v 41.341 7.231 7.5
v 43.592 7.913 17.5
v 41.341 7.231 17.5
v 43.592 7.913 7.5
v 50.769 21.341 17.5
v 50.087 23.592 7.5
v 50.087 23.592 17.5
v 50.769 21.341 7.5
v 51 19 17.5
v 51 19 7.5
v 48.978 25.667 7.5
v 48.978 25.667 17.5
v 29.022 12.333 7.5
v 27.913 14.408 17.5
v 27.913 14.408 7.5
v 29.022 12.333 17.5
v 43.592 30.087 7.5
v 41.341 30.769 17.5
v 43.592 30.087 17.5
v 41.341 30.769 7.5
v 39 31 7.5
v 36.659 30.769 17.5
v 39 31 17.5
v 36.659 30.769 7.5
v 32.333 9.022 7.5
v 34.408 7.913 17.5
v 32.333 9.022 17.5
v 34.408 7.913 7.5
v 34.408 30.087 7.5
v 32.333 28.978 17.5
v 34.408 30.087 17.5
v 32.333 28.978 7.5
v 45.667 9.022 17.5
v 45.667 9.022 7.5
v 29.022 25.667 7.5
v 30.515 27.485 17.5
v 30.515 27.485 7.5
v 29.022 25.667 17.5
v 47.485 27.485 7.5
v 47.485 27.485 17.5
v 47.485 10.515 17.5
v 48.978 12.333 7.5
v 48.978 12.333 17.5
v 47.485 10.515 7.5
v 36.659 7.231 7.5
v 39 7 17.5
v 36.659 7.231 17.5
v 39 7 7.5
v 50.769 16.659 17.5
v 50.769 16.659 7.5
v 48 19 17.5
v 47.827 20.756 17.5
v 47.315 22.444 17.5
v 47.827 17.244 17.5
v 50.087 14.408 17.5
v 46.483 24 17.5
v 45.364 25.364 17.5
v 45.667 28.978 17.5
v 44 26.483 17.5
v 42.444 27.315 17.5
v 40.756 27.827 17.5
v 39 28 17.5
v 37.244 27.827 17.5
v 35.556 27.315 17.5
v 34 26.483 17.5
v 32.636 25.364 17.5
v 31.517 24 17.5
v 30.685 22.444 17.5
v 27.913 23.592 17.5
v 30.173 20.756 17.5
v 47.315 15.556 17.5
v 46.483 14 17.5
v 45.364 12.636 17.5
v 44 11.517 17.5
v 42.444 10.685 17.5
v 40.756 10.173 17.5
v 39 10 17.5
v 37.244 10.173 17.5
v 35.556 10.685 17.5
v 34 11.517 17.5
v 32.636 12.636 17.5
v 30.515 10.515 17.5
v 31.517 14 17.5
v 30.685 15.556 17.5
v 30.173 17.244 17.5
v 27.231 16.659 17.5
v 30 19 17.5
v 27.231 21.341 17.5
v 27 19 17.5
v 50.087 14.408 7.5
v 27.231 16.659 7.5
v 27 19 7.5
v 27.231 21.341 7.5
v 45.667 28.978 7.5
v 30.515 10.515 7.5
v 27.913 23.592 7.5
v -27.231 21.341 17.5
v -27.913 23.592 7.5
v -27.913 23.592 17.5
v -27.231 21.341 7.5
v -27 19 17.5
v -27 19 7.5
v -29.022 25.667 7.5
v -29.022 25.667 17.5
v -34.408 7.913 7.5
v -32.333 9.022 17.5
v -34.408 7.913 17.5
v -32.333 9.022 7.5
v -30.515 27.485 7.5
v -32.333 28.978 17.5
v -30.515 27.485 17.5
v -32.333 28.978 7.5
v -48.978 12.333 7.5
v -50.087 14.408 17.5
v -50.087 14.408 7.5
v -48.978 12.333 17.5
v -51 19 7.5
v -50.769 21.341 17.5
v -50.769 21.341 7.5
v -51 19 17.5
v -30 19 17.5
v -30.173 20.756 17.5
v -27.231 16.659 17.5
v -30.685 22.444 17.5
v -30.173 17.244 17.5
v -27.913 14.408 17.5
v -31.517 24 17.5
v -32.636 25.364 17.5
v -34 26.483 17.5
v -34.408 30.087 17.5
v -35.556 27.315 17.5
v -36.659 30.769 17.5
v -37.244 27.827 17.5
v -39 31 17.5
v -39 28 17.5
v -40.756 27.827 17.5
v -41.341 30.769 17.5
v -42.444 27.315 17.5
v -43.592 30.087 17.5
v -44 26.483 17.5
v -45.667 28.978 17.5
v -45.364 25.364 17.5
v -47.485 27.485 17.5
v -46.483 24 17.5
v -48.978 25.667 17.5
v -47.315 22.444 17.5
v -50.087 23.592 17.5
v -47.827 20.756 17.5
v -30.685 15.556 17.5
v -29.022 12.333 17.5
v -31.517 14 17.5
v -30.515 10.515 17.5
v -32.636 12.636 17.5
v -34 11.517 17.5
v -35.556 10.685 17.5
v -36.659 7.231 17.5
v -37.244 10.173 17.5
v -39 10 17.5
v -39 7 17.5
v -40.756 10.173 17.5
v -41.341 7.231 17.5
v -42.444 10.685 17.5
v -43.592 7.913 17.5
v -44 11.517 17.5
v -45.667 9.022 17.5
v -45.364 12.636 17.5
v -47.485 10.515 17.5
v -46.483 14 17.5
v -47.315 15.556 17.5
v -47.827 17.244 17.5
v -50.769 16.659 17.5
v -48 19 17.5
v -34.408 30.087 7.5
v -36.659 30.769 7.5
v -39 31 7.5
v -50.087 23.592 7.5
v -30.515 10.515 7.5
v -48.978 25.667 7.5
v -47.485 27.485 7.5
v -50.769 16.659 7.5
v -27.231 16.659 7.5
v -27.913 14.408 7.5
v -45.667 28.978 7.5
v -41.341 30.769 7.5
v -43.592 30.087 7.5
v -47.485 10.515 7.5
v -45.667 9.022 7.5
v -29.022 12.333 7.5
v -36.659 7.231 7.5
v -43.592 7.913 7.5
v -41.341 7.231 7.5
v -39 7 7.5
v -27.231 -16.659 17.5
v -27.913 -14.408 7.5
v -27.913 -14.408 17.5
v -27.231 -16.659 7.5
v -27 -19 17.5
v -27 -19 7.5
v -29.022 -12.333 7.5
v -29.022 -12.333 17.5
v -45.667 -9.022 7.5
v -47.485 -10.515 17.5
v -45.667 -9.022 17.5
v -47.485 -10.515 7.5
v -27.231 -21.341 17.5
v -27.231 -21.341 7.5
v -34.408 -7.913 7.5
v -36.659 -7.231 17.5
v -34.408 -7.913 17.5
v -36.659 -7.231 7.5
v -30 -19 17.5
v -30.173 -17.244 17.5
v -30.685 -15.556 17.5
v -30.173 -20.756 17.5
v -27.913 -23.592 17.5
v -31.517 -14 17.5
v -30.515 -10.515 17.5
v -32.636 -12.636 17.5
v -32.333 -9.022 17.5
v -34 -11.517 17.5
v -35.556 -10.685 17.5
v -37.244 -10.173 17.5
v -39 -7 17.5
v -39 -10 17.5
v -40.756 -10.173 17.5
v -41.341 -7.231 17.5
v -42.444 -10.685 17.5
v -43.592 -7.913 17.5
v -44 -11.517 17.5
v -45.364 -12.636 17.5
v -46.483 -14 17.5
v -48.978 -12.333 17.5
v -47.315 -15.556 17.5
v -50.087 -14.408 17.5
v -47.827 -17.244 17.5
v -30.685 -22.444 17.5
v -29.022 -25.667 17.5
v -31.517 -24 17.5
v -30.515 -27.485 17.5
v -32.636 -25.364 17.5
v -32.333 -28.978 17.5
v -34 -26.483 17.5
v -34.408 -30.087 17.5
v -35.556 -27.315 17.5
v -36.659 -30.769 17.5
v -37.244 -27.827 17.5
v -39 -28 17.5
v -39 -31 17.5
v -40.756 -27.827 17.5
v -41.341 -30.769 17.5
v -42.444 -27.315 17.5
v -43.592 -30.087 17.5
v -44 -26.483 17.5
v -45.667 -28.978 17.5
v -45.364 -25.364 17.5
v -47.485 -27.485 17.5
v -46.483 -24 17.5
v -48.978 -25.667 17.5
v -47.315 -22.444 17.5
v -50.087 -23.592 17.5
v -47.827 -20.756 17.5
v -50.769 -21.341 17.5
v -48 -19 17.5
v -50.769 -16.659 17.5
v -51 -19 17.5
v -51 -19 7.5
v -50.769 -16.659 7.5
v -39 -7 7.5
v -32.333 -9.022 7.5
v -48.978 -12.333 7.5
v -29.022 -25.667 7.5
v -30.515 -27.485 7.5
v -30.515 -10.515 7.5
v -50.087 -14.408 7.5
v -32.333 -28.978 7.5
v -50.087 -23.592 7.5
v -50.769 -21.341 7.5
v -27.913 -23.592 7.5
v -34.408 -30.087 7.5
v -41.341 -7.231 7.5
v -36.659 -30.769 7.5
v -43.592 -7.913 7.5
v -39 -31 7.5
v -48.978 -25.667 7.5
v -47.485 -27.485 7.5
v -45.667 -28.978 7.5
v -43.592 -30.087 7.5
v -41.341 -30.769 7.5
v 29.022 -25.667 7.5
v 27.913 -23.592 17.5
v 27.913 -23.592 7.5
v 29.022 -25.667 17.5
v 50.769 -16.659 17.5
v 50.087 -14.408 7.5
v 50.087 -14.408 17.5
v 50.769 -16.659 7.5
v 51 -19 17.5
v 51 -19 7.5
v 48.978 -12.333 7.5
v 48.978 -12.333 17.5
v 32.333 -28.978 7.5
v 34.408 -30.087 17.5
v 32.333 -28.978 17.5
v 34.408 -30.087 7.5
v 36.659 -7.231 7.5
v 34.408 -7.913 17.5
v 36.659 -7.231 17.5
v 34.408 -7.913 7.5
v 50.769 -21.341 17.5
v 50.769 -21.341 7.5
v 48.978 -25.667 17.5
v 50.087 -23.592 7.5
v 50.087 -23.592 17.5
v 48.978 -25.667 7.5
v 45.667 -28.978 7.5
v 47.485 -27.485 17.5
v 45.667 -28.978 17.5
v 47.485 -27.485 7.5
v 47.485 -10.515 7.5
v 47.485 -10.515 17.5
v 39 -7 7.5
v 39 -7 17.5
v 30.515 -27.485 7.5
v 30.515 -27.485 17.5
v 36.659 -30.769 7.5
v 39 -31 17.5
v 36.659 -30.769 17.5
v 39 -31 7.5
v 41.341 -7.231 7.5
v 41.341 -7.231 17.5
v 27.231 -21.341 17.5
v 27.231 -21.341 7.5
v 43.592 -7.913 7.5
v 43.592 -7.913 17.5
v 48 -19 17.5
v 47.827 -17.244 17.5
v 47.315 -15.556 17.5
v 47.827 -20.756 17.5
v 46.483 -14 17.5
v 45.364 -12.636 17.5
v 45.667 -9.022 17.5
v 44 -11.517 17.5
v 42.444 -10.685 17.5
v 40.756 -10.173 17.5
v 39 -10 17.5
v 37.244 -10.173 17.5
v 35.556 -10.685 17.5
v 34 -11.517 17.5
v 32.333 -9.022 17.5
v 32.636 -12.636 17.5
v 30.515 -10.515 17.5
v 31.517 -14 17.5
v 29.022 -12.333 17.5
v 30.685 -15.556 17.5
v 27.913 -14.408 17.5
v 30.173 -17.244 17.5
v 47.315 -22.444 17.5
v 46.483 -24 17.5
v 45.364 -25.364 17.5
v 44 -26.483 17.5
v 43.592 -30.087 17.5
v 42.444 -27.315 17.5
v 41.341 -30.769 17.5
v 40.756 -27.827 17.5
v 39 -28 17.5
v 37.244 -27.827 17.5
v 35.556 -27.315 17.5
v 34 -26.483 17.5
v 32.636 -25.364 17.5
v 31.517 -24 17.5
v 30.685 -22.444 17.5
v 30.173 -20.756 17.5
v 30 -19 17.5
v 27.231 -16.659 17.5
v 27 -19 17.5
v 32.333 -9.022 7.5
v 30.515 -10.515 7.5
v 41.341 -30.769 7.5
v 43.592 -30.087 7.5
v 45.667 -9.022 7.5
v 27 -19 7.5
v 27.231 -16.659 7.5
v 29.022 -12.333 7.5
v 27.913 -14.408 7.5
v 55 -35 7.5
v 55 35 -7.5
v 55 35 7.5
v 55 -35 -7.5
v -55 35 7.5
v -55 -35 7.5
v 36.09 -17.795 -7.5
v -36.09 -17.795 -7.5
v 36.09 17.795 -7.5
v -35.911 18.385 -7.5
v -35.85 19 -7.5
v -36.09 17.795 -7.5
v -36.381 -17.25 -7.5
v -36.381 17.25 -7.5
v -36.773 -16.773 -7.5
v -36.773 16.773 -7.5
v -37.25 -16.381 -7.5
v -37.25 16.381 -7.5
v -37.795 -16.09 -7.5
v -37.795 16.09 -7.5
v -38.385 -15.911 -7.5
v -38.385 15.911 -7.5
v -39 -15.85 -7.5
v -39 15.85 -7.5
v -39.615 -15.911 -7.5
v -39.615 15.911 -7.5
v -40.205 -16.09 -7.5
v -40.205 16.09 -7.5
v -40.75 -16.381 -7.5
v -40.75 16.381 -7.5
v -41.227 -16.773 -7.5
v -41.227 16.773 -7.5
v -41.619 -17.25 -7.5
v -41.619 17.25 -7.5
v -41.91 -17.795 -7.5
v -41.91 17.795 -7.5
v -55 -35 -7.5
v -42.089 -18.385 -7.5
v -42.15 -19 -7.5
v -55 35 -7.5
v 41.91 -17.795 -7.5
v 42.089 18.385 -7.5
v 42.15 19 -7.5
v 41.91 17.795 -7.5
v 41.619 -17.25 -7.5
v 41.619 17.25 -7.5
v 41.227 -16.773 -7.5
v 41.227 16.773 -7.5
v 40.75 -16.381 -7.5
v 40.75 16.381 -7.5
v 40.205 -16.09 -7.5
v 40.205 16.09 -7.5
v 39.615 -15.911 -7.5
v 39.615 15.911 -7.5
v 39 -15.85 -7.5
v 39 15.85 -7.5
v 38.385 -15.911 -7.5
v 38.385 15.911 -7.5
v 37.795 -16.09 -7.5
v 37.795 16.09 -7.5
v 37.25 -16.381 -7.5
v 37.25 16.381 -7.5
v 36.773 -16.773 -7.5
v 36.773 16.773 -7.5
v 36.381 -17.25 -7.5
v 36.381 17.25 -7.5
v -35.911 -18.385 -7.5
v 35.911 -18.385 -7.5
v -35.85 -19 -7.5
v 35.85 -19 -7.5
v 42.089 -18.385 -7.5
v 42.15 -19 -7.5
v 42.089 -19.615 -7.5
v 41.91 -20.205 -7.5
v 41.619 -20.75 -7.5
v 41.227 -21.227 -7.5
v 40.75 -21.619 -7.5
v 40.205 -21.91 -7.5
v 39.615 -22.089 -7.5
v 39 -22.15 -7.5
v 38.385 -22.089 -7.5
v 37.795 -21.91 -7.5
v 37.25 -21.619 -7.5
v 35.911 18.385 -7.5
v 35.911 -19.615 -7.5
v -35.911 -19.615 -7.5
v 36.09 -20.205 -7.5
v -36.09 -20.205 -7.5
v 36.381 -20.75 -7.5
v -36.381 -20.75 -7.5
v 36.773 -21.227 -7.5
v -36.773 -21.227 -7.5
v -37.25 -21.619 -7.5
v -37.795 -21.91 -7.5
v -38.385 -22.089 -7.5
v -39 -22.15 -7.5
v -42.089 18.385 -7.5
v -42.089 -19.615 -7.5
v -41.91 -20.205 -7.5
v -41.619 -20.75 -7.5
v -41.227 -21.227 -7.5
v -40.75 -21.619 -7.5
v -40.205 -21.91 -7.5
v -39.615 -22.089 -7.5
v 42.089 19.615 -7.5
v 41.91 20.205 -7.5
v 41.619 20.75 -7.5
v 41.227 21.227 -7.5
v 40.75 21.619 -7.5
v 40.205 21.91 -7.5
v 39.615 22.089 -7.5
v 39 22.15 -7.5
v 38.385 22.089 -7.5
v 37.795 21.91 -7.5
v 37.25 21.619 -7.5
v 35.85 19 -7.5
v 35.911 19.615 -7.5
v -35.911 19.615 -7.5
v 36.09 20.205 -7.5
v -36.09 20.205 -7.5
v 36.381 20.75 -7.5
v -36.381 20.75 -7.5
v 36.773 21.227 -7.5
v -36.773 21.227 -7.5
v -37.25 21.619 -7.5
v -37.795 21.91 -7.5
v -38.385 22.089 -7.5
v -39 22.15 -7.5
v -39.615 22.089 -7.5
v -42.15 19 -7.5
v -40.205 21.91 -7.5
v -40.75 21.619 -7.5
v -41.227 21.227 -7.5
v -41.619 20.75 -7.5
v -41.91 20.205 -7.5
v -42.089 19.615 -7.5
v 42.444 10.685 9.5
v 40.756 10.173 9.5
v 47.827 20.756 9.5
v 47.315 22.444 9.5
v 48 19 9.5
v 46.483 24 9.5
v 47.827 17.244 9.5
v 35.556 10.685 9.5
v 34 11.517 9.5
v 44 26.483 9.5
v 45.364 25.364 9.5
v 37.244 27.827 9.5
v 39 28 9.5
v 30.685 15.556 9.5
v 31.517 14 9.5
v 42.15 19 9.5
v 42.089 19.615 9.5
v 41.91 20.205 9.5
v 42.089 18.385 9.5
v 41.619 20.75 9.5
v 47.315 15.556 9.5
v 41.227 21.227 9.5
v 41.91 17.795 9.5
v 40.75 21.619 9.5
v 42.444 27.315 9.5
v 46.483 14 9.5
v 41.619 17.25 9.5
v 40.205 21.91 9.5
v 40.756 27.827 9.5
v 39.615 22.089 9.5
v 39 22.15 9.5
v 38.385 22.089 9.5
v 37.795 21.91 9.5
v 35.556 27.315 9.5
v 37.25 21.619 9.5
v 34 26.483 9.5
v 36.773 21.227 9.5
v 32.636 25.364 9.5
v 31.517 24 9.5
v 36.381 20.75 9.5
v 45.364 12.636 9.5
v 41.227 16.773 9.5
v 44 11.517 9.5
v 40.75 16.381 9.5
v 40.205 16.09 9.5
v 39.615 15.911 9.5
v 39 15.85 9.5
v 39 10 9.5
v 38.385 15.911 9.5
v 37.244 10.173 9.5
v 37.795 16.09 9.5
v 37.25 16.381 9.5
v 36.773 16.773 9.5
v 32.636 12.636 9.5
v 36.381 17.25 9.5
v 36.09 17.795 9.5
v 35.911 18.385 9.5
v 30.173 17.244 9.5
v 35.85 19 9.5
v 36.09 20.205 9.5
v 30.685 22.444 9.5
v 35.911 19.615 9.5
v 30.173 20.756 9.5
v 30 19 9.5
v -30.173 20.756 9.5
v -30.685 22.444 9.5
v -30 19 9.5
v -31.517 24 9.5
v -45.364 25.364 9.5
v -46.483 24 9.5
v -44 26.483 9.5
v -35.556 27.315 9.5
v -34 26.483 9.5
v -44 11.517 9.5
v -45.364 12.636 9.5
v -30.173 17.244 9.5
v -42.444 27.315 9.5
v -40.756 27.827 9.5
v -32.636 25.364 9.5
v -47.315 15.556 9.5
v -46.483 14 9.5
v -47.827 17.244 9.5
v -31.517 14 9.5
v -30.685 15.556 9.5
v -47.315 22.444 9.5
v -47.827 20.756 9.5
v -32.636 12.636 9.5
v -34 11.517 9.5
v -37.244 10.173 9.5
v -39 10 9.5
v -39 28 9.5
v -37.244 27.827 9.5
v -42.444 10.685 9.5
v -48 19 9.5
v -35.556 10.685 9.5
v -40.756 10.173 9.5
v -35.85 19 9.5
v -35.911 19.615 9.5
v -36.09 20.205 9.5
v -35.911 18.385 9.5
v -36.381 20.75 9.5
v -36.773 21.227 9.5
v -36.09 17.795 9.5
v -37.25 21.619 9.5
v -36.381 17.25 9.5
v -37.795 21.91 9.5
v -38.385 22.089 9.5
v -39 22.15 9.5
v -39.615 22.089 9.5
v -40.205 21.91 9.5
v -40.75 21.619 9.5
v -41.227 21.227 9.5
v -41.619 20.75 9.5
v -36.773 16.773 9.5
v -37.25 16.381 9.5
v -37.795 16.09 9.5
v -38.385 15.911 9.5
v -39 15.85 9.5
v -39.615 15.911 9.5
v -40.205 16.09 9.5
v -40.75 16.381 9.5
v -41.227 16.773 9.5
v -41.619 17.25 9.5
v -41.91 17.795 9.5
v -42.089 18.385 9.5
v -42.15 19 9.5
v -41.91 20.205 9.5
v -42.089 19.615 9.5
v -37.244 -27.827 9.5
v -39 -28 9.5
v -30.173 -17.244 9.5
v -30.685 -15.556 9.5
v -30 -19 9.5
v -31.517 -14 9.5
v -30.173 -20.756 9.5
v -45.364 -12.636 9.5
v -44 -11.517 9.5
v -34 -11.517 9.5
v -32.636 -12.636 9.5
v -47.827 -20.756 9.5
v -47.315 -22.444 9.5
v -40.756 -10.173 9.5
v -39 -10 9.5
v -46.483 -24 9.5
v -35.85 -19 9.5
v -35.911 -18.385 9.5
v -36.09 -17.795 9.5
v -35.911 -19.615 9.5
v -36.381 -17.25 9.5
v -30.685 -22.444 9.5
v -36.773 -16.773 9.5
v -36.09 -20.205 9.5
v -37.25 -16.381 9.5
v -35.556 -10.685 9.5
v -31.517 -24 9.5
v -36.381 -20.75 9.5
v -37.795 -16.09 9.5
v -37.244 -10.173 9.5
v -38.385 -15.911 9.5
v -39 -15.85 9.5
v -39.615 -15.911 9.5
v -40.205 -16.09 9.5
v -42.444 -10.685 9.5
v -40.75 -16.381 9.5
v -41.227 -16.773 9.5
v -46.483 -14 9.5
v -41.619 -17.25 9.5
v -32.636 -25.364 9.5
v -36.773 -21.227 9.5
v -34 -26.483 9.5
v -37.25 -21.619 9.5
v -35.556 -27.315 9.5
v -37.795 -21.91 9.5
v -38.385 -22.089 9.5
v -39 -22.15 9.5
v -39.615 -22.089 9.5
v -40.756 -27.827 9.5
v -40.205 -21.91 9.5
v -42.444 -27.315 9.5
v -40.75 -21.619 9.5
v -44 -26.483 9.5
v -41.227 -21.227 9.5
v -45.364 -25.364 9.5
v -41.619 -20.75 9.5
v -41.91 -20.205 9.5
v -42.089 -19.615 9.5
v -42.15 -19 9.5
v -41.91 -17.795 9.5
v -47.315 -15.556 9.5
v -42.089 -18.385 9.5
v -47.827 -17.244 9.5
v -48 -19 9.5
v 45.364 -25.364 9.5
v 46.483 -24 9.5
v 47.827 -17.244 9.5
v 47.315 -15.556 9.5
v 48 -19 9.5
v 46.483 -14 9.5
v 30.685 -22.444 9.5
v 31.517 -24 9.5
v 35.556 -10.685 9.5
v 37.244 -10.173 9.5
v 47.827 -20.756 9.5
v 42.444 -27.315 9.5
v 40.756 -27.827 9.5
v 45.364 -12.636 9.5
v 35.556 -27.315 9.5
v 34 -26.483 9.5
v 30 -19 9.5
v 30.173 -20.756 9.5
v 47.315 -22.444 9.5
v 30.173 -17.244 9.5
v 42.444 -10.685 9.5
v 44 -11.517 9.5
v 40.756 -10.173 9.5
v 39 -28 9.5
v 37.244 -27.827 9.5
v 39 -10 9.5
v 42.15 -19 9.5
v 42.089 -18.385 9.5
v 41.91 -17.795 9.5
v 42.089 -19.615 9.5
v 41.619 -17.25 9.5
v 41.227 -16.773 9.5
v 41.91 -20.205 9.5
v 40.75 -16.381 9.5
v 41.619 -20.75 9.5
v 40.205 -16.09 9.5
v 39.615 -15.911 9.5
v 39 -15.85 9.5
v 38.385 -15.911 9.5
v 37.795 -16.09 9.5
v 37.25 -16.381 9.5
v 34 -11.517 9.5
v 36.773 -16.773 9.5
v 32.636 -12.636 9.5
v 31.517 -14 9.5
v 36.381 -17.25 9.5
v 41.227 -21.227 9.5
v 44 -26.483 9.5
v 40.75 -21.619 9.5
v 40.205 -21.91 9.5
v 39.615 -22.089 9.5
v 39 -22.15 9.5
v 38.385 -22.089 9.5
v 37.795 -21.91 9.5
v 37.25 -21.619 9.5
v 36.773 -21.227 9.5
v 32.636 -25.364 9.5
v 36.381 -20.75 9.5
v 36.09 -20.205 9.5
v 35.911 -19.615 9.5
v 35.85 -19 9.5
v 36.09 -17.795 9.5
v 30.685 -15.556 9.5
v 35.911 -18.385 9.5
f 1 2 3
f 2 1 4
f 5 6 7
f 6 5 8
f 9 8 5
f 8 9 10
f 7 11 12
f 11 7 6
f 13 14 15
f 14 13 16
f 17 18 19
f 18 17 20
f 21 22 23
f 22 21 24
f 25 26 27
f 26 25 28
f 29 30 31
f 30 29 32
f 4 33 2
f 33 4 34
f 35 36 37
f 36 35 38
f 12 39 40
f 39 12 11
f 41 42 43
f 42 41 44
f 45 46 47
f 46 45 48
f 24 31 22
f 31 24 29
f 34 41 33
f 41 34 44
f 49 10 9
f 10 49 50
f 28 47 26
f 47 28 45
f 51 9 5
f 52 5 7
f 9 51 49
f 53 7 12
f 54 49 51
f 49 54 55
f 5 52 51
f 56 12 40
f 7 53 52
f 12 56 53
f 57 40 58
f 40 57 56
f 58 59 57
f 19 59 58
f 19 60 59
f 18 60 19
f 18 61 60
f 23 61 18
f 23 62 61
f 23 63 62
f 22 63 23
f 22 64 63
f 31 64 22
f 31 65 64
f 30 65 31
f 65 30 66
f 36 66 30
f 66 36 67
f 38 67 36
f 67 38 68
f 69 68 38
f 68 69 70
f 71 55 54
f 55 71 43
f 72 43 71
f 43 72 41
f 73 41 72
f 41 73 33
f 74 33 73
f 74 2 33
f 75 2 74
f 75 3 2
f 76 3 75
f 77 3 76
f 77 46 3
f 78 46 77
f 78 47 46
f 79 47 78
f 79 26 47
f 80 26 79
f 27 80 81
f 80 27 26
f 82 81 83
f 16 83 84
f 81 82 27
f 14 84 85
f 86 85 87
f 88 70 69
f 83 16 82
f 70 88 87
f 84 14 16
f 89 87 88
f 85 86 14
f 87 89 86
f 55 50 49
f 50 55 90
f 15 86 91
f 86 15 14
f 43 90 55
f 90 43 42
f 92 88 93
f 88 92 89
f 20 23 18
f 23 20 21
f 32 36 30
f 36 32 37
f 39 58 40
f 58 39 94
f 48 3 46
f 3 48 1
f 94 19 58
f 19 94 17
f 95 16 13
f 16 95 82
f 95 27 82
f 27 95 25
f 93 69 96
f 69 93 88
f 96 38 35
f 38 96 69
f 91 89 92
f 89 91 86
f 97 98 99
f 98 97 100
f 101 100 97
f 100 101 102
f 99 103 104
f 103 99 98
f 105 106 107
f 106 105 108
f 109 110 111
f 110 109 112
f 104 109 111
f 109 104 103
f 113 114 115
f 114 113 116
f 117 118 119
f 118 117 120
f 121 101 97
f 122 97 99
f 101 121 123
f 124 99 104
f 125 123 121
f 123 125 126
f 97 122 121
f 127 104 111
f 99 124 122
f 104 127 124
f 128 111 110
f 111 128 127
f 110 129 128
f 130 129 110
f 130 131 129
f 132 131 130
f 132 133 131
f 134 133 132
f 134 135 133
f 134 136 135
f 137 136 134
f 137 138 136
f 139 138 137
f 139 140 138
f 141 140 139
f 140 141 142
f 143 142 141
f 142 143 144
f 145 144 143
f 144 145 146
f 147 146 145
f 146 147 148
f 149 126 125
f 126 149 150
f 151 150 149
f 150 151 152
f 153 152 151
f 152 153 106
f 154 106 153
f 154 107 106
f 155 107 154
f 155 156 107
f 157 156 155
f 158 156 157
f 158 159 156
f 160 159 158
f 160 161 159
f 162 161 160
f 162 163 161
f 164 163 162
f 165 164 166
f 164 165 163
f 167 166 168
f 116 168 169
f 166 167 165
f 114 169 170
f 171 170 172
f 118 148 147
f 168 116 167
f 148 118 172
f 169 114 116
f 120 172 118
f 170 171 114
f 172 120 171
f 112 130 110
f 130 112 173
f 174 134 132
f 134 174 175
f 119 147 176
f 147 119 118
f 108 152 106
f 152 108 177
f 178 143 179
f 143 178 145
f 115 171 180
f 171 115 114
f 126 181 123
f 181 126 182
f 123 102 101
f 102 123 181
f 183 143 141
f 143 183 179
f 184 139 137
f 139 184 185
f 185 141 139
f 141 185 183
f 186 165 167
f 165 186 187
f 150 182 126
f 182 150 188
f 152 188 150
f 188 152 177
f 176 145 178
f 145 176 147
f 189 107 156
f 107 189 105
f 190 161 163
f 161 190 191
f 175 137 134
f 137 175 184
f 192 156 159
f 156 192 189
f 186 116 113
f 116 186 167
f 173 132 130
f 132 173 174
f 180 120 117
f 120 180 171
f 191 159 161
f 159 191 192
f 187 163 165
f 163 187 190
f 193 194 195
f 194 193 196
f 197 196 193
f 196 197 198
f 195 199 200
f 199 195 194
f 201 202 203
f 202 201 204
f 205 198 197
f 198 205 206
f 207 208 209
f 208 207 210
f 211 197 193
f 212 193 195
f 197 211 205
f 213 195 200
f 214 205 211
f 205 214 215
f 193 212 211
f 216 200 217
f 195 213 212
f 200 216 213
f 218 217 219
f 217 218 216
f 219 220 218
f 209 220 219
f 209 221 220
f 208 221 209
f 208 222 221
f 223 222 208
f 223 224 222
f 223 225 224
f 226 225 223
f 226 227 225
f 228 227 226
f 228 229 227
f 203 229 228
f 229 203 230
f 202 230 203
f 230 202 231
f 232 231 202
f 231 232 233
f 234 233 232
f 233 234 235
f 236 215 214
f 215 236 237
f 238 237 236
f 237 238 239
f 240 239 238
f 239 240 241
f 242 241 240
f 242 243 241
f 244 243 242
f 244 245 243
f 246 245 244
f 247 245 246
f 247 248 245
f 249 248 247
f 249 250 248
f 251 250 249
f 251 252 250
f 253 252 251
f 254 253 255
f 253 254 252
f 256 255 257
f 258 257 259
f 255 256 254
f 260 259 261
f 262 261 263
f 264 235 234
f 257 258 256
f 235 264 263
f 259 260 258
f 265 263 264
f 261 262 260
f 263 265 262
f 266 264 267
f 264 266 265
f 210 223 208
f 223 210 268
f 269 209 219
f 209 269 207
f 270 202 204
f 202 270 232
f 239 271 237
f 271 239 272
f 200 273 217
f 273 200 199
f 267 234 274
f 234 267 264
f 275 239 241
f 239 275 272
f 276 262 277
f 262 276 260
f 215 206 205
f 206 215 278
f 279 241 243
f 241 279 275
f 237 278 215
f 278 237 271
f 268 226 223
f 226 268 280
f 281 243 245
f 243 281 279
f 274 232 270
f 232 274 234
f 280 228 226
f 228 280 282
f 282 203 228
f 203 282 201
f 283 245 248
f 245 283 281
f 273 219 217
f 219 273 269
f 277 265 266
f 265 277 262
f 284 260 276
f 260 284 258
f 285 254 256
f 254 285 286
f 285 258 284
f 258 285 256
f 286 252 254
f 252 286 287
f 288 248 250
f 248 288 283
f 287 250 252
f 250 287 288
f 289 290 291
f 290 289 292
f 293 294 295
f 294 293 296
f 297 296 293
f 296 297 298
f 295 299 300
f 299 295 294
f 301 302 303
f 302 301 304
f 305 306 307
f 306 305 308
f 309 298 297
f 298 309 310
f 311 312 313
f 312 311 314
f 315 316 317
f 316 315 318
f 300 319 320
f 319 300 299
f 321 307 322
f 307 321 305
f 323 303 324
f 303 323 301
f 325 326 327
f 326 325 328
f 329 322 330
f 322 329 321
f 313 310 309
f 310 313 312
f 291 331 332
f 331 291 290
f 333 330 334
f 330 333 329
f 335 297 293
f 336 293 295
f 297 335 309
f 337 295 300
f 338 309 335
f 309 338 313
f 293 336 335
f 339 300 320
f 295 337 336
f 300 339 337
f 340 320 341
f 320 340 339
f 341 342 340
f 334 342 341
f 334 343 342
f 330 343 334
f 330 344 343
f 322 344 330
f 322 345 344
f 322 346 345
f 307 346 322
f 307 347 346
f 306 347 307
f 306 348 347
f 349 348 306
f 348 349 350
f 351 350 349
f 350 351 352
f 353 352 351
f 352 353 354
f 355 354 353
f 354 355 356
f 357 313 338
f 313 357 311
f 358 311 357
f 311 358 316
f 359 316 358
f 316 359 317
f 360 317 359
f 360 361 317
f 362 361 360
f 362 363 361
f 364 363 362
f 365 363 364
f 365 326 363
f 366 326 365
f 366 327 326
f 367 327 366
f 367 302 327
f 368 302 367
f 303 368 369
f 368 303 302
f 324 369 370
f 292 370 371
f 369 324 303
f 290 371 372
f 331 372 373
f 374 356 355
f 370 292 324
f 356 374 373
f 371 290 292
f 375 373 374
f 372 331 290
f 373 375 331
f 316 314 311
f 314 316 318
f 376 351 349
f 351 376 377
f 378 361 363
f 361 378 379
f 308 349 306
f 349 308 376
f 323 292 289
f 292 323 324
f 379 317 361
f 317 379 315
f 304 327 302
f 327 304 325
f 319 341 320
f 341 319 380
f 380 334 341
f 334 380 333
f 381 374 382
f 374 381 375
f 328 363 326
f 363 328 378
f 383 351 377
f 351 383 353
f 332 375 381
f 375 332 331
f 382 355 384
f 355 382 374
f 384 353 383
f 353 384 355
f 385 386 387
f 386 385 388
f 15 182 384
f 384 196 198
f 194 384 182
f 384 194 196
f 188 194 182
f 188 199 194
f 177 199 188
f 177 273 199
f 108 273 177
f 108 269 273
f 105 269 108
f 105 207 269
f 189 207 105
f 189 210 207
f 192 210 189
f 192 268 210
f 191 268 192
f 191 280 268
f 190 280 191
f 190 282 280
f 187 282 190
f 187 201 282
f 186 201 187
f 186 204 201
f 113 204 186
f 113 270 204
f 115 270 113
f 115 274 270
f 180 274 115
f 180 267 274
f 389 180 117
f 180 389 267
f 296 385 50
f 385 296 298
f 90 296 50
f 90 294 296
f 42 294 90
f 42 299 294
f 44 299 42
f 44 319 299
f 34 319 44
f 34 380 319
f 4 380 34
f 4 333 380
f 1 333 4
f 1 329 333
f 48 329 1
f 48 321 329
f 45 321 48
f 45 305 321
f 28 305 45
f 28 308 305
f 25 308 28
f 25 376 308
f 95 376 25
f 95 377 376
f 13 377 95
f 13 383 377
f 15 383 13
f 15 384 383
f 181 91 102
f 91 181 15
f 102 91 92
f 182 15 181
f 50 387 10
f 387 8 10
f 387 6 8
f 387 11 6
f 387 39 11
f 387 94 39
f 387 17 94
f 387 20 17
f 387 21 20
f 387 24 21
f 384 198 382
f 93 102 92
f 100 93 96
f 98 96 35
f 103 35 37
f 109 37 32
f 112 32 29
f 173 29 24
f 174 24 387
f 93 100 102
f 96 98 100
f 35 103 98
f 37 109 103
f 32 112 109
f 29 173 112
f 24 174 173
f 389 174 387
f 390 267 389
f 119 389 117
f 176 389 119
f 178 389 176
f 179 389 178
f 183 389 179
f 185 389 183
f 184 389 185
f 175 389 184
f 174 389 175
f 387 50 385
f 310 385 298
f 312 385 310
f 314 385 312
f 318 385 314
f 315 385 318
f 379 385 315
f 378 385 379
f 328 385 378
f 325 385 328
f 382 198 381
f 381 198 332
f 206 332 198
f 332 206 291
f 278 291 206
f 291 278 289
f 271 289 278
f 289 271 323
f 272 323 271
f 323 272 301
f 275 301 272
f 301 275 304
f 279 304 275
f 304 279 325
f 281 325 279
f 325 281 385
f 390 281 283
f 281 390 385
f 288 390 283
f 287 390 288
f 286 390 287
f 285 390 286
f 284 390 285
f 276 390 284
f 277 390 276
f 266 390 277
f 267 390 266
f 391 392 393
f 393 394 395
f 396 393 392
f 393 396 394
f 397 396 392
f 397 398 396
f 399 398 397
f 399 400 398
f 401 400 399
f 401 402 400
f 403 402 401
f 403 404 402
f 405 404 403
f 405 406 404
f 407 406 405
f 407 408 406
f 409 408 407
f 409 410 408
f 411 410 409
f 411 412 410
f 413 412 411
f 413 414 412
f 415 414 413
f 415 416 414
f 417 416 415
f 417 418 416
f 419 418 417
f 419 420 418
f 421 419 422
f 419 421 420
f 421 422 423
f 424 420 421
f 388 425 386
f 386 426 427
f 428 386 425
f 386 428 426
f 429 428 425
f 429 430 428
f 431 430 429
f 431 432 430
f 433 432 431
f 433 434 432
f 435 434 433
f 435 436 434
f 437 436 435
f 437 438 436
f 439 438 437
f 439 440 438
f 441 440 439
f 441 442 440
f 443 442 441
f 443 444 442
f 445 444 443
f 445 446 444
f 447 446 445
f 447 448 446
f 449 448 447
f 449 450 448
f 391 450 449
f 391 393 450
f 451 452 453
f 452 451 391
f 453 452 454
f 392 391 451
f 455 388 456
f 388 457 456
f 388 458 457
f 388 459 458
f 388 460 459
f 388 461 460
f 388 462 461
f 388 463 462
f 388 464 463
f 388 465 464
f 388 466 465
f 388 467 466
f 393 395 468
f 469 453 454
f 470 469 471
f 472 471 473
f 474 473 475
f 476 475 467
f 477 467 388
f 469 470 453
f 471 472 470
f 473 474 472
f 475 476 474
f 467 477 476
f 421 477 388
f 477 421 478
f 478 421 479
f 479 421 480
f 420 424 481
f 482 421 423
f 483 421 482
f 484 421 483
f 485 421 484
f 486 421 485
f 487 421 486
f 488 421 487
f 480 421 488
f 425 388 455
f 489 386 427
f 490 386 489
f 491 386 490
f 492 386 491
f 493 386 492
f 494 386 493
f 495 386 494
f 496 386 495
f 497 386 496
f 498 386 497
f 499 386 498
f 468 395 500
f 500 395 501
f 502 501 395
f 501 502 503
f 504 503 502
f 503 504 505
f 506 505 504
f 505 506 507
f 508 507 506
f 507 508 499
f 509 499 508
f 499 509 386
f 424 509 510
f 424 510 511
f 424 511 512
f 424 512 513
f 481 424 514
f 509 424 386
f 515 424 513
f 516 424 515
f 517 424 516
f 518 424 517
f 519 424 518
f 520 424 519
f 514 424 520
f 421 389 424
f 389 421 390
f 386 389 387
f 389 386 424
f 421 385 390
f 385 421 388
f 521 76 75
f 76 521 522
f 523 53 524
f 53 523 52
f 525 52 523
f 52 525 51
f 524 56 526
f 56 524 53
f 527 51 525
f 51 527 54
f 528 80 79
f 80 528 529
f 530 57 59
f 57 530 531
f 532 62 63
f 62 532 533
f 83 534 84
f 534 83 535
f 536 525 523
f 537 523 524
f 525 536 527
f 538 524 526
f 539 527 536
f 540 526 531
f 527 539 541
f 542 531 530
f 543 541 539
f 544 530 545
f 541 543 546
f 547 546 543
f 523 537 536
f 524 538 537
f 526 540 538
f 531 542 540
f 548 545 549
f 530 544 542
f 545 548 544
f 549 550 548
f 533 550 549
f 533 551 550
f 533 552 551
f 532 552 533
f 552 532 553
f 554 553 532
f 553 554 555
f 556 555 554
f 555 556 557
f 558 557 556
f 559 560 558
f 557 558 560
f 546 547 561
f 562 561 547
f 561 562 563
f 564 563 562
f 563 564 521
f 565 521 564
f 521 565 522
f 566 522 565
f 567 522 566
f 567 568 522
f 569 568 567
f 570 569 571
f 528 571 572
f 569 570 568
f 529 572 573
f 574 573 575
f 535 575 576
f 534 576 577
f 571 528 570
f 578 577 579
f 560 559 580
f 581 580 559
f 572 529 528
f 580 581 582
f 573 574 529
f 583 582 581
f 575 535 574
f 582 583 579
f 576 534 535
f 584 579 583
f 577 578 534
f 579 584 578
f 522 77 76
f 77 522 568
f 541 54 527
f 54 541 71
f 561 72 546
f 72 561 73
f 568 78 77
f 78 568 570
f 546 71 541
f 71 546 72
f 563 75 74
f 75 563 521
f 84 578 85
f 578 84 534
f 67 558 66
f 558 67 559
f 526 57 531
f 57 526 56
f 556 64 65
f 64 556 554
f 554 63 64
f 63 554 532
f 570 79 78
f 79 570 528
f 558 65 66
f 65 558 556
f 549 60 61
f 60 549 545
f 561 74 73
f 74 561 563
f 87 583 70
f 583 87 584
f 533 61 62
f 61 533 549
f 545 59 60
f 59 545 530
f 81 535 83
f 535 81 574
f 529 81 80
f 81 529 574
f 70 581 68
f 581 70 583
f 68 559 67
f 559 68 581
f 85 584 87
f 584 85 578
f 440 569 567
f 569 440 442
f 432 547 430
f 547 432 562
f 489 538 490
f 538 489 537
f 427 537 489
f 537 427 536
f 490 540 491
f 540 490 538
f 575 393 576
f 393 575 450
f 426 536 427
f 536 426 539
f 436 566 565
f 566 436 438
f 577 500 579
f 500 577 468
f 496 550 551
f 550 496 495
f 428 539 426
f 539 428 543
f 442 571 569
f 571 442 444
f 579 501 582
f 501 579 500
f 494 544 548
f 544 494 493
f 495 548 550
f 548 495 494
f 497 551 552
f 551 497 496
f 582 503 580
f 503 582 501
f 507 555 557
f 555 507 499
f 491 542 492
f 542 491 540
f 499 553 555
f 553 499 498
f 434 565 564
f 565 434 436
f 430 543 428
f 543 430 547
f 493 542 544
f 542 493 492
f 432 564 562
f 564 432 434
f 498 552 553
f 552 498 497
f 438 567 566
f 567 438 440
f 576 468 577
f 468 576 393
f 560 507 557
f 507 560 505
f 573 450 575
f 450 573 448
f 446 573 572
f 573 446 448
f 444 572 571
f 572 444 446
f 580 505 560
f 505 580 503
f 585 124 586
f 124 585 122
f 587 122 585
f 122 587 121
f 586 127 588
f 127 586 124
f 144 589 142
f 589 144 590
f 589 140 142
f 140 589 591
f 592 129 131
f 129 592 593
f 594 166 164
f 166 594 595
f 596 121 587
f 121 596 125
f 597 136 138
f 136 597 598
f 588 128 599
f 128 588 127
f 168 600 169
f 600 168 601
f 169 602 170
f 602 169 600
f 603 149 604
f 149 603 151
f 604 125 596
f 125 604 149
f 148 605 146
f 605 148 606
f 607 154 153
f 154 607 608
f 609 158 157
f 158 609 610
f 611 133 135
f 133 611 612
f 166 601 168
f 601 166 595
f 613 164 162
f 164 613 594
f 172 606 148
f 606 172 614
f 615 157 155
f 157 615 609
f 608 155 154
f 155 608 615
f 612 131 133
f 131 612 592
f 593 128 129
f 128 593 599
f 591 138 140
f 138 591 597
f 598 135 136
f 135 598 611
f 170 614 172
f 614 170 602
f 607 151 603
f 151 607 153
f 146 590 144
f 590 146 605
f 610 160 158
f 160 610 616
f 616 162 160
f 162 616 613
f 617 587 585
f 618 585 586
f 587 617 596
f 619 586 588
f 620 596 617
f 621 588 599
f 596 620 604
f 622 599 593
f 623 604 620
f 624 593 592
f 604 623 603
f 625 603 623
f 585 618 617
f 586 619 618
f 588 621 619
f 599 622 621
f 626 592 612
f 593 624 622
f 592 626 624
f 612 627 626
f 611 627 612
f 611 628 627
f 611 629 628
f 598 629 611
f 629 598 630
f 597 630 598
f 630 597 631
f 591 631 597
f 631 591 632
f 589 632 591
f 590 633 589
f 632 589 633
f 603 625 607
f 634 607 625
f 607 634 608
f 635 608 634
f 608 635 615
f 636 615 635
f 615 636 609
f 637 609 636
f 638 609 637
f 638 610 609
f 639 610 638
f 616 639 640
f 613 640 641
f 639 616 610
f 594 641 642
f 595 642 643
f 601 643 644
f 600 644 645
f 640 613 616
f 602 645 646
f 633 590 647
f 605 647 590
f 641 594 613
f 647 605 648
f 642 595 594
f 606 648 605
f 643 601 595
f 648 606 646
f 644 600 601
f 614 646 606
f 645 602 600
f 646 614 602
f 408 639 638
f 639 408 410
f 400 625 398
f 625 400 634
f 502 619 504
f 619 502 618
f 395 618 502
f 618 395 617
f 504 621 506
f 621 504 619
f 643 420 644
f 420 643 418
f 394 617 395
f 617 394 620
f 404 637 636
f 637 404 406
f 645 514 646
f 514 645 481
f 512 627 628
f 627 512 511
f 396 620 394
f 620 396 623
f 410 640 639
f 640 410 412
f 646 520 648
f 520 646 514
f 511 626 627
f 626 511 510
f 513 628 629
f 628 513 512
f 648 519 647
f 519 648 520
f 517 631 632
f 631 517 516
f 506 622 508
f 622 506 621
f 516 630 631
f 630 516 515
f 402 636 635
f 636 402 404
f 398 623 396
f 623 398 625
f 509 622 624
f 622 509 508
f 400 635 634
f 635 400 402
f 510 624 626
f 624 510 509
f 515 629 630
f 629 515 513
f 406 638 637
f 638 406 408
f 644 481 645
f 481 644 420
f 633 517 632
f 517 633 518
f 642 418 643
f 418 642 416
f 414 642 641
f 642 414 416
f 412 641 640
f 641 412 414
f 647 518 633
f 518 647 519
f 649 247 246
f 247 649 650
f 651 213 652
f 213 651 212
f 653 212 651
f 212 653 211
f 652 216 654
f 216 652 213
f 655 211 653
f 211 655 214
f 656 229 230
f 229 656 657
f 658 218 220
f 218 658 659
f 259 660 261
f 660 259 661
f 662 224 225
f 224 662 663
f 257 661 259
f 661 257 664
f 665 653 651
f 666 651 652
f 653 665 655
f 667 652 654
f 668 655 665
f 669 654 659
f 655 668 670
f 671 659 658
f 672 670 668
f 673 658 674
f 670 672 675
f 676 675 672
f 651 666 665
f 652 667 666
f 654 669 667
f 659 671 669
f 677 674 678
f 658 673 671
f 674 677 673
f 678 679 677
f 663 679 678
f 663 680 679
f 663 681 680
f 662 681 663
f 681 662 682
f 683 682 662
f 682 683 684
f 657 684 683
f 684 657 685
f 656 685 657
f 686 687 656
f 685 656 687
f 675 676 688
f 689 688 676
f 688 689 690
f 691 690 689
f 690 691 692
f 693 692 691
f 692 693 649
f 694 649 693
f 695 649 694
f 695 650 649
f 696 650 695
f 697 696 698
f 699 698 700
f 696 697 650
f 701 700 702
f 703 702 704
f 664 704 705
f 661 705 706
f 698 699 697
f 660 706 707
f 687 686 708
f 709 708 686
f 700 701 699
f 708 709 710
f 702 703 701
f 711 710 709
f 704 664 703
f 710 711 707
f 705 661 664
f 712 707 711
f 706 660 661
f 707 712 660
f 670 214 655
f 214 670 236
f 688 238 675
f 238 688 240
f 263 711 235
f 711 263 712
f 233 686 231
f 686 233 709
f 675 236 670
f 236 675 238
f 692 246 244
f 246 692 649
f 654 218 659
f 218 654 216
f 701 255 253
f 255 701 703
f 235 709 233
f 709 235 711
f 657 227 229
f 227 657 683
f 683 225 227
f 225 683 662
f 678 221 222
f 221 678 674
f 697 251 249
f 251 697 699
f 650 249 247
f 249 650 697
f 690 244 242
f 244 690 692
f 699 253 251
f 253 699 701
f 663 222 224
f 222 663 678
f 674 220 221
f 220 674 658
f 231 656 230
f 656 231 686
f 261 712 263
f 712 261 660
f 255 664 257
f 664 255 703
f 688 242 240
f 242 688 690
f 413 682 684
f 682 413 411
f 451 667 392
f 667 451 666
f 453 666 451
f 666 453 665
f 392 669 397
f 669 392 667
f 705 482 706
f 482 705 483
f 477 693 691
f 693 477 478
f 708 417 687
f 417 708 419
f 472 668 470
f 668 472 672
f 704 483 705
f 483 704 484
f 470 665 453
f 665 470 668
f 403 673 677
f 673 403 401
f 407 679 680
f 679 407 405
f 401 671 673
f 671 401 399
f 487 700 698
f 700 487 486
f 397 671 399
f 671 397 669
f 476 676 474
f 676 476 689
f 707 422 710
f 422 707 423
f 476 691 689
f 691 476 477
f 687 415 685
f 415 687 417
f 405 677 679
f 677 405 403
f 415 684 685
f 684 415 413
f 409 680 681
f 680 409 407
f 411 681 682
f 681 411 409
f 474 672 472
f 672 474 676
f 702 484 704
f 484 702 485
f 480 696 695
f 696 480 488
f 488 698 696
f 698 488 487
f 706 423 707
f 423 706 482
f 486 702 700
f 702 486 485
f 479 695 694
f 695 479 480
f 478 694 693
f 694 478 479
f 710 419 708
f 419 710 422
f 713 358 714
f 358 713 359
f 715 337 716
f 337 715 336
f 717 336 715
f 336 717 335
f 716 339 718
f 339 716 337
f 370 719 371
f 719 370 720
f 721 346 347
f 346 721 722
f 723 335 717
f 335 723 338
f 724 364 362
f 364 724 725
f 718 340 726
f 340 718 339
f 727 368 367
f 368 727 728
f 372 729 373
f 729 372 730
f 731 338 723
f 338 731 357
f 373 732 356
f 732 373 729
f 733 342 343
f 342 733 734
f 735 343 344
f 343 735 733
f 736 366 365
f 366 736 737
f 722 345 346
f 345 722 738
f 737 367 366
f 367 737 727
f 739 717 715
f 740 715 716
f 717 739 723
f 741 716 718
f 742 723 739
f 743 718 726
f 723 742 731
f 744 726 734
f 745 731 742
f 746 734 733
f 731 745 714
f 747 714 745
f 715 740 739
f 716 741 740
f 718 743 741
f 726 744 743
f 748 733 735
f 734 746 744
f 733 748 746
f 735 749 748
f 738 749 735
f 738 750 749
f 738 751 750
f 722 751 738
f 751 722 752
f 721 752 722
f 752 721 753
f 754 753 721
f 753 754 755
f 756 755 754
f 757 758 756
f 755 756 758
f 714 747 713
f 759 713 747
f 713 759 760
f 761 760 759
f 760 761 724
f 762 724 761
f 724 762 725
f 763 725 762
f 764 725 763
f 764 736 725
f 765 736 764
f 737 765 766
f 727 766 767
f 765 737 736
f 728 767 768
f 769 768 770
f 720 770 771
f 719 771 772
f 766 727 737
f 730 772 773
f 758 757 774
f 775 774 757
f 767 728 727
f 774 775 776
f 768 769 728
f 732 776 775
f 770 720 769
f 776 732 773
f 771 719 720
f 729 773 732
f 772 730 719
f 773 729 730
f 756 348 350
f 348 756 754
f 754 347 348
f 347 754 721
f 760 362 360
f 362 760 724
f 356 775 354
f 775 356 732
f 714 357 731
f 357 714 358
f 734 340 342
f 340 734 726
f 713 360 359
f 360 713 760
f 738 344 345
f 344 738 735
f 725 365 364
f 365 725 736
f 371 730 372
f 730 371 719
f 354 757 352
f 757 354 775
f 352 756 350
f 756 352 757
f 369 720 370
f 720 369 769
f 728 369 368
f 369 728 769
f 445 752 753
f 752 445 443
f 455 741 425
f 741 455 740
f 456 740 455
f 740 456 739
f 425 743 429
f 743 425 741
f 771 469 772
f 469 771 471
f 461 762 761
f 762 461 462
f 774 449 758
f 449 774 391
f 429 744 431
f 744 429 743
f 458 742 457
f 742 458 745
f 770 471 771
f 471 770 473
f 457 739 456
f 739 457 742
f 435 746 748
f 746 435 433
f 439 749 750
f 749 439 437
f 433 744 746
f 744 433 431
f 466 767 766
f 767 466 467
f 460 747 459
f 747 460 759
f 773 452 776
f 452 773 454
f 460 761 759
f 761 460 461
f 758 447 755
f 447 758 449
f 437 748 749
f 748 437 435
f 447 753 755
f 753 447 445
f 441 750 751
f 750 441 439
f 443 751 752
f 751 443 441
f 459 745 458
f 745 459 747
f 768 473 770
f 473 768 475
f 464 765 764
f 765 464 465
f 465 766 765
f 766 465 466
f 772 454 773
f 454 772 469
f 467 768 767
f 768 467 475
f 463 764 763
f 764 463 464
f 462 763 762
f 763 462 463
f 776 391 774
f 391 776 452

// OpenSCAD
$fn = 32;

// ----------------------------------------------------------------------
// Socket pad plate
// bosses with counterbored sockets for the screws
// ----------------------------------------------------------------------

// --- parameters (mm) ---
base_t = 15;            // base plate thickness
boss_h = 10;            // boss height above the base plate
boss_d = 24;            // boss diameter
socket_d = 18;          // socket diameter
socket_depth = 8;       // socket depth from the boss face
bolt_d = 6.3;           // screw clearance hole through the socket floor
plate = [110, 70, 15];  // overall size (x, y, z)
edge = 16;              // boss centre offset from the plate edge
pads = 4;               // boss count, one per corner

// --- derived feature positions (mm) ---
height = base_t + boss_h;        // = 25   overall height of the part
corner_x = plate[0] / 2 - edge;  // = 39   boss centre X
corner_y = plate[1] / 2 - edge;  // = 19   boss centre Y
feature_centers = [
  [corner_x, corner_y],
  [-corner_x, corner_y],
  [-corner_x, -corner_y],
  [corner_x, -corner_y]
];   // boss centres: sockets, holes and the pads themselves are placed from here

// base plate, bosses on feature_centers, socket + through hole in each
difference() {
  union() {
    cube(plate, center = true);
    for (centre = feature_centers)
      translate([centre[0], centre[1], plate[2] / 2 - 1])
        cylinder(d = boss_d, h = boss_h + 1);
  }
  for (centre = feature_centers) {
    translate([centre[0], centre[1], plate[2] / 2 + boss_h - socket_depth])
      cylinder(d = socket_d, h = socket_depth + 1);
    translate([centre[0], centre[1], -height])
      cylinder(d = bolt_d, h = 2 * height + 2);  // through the socket floor
  }
}
